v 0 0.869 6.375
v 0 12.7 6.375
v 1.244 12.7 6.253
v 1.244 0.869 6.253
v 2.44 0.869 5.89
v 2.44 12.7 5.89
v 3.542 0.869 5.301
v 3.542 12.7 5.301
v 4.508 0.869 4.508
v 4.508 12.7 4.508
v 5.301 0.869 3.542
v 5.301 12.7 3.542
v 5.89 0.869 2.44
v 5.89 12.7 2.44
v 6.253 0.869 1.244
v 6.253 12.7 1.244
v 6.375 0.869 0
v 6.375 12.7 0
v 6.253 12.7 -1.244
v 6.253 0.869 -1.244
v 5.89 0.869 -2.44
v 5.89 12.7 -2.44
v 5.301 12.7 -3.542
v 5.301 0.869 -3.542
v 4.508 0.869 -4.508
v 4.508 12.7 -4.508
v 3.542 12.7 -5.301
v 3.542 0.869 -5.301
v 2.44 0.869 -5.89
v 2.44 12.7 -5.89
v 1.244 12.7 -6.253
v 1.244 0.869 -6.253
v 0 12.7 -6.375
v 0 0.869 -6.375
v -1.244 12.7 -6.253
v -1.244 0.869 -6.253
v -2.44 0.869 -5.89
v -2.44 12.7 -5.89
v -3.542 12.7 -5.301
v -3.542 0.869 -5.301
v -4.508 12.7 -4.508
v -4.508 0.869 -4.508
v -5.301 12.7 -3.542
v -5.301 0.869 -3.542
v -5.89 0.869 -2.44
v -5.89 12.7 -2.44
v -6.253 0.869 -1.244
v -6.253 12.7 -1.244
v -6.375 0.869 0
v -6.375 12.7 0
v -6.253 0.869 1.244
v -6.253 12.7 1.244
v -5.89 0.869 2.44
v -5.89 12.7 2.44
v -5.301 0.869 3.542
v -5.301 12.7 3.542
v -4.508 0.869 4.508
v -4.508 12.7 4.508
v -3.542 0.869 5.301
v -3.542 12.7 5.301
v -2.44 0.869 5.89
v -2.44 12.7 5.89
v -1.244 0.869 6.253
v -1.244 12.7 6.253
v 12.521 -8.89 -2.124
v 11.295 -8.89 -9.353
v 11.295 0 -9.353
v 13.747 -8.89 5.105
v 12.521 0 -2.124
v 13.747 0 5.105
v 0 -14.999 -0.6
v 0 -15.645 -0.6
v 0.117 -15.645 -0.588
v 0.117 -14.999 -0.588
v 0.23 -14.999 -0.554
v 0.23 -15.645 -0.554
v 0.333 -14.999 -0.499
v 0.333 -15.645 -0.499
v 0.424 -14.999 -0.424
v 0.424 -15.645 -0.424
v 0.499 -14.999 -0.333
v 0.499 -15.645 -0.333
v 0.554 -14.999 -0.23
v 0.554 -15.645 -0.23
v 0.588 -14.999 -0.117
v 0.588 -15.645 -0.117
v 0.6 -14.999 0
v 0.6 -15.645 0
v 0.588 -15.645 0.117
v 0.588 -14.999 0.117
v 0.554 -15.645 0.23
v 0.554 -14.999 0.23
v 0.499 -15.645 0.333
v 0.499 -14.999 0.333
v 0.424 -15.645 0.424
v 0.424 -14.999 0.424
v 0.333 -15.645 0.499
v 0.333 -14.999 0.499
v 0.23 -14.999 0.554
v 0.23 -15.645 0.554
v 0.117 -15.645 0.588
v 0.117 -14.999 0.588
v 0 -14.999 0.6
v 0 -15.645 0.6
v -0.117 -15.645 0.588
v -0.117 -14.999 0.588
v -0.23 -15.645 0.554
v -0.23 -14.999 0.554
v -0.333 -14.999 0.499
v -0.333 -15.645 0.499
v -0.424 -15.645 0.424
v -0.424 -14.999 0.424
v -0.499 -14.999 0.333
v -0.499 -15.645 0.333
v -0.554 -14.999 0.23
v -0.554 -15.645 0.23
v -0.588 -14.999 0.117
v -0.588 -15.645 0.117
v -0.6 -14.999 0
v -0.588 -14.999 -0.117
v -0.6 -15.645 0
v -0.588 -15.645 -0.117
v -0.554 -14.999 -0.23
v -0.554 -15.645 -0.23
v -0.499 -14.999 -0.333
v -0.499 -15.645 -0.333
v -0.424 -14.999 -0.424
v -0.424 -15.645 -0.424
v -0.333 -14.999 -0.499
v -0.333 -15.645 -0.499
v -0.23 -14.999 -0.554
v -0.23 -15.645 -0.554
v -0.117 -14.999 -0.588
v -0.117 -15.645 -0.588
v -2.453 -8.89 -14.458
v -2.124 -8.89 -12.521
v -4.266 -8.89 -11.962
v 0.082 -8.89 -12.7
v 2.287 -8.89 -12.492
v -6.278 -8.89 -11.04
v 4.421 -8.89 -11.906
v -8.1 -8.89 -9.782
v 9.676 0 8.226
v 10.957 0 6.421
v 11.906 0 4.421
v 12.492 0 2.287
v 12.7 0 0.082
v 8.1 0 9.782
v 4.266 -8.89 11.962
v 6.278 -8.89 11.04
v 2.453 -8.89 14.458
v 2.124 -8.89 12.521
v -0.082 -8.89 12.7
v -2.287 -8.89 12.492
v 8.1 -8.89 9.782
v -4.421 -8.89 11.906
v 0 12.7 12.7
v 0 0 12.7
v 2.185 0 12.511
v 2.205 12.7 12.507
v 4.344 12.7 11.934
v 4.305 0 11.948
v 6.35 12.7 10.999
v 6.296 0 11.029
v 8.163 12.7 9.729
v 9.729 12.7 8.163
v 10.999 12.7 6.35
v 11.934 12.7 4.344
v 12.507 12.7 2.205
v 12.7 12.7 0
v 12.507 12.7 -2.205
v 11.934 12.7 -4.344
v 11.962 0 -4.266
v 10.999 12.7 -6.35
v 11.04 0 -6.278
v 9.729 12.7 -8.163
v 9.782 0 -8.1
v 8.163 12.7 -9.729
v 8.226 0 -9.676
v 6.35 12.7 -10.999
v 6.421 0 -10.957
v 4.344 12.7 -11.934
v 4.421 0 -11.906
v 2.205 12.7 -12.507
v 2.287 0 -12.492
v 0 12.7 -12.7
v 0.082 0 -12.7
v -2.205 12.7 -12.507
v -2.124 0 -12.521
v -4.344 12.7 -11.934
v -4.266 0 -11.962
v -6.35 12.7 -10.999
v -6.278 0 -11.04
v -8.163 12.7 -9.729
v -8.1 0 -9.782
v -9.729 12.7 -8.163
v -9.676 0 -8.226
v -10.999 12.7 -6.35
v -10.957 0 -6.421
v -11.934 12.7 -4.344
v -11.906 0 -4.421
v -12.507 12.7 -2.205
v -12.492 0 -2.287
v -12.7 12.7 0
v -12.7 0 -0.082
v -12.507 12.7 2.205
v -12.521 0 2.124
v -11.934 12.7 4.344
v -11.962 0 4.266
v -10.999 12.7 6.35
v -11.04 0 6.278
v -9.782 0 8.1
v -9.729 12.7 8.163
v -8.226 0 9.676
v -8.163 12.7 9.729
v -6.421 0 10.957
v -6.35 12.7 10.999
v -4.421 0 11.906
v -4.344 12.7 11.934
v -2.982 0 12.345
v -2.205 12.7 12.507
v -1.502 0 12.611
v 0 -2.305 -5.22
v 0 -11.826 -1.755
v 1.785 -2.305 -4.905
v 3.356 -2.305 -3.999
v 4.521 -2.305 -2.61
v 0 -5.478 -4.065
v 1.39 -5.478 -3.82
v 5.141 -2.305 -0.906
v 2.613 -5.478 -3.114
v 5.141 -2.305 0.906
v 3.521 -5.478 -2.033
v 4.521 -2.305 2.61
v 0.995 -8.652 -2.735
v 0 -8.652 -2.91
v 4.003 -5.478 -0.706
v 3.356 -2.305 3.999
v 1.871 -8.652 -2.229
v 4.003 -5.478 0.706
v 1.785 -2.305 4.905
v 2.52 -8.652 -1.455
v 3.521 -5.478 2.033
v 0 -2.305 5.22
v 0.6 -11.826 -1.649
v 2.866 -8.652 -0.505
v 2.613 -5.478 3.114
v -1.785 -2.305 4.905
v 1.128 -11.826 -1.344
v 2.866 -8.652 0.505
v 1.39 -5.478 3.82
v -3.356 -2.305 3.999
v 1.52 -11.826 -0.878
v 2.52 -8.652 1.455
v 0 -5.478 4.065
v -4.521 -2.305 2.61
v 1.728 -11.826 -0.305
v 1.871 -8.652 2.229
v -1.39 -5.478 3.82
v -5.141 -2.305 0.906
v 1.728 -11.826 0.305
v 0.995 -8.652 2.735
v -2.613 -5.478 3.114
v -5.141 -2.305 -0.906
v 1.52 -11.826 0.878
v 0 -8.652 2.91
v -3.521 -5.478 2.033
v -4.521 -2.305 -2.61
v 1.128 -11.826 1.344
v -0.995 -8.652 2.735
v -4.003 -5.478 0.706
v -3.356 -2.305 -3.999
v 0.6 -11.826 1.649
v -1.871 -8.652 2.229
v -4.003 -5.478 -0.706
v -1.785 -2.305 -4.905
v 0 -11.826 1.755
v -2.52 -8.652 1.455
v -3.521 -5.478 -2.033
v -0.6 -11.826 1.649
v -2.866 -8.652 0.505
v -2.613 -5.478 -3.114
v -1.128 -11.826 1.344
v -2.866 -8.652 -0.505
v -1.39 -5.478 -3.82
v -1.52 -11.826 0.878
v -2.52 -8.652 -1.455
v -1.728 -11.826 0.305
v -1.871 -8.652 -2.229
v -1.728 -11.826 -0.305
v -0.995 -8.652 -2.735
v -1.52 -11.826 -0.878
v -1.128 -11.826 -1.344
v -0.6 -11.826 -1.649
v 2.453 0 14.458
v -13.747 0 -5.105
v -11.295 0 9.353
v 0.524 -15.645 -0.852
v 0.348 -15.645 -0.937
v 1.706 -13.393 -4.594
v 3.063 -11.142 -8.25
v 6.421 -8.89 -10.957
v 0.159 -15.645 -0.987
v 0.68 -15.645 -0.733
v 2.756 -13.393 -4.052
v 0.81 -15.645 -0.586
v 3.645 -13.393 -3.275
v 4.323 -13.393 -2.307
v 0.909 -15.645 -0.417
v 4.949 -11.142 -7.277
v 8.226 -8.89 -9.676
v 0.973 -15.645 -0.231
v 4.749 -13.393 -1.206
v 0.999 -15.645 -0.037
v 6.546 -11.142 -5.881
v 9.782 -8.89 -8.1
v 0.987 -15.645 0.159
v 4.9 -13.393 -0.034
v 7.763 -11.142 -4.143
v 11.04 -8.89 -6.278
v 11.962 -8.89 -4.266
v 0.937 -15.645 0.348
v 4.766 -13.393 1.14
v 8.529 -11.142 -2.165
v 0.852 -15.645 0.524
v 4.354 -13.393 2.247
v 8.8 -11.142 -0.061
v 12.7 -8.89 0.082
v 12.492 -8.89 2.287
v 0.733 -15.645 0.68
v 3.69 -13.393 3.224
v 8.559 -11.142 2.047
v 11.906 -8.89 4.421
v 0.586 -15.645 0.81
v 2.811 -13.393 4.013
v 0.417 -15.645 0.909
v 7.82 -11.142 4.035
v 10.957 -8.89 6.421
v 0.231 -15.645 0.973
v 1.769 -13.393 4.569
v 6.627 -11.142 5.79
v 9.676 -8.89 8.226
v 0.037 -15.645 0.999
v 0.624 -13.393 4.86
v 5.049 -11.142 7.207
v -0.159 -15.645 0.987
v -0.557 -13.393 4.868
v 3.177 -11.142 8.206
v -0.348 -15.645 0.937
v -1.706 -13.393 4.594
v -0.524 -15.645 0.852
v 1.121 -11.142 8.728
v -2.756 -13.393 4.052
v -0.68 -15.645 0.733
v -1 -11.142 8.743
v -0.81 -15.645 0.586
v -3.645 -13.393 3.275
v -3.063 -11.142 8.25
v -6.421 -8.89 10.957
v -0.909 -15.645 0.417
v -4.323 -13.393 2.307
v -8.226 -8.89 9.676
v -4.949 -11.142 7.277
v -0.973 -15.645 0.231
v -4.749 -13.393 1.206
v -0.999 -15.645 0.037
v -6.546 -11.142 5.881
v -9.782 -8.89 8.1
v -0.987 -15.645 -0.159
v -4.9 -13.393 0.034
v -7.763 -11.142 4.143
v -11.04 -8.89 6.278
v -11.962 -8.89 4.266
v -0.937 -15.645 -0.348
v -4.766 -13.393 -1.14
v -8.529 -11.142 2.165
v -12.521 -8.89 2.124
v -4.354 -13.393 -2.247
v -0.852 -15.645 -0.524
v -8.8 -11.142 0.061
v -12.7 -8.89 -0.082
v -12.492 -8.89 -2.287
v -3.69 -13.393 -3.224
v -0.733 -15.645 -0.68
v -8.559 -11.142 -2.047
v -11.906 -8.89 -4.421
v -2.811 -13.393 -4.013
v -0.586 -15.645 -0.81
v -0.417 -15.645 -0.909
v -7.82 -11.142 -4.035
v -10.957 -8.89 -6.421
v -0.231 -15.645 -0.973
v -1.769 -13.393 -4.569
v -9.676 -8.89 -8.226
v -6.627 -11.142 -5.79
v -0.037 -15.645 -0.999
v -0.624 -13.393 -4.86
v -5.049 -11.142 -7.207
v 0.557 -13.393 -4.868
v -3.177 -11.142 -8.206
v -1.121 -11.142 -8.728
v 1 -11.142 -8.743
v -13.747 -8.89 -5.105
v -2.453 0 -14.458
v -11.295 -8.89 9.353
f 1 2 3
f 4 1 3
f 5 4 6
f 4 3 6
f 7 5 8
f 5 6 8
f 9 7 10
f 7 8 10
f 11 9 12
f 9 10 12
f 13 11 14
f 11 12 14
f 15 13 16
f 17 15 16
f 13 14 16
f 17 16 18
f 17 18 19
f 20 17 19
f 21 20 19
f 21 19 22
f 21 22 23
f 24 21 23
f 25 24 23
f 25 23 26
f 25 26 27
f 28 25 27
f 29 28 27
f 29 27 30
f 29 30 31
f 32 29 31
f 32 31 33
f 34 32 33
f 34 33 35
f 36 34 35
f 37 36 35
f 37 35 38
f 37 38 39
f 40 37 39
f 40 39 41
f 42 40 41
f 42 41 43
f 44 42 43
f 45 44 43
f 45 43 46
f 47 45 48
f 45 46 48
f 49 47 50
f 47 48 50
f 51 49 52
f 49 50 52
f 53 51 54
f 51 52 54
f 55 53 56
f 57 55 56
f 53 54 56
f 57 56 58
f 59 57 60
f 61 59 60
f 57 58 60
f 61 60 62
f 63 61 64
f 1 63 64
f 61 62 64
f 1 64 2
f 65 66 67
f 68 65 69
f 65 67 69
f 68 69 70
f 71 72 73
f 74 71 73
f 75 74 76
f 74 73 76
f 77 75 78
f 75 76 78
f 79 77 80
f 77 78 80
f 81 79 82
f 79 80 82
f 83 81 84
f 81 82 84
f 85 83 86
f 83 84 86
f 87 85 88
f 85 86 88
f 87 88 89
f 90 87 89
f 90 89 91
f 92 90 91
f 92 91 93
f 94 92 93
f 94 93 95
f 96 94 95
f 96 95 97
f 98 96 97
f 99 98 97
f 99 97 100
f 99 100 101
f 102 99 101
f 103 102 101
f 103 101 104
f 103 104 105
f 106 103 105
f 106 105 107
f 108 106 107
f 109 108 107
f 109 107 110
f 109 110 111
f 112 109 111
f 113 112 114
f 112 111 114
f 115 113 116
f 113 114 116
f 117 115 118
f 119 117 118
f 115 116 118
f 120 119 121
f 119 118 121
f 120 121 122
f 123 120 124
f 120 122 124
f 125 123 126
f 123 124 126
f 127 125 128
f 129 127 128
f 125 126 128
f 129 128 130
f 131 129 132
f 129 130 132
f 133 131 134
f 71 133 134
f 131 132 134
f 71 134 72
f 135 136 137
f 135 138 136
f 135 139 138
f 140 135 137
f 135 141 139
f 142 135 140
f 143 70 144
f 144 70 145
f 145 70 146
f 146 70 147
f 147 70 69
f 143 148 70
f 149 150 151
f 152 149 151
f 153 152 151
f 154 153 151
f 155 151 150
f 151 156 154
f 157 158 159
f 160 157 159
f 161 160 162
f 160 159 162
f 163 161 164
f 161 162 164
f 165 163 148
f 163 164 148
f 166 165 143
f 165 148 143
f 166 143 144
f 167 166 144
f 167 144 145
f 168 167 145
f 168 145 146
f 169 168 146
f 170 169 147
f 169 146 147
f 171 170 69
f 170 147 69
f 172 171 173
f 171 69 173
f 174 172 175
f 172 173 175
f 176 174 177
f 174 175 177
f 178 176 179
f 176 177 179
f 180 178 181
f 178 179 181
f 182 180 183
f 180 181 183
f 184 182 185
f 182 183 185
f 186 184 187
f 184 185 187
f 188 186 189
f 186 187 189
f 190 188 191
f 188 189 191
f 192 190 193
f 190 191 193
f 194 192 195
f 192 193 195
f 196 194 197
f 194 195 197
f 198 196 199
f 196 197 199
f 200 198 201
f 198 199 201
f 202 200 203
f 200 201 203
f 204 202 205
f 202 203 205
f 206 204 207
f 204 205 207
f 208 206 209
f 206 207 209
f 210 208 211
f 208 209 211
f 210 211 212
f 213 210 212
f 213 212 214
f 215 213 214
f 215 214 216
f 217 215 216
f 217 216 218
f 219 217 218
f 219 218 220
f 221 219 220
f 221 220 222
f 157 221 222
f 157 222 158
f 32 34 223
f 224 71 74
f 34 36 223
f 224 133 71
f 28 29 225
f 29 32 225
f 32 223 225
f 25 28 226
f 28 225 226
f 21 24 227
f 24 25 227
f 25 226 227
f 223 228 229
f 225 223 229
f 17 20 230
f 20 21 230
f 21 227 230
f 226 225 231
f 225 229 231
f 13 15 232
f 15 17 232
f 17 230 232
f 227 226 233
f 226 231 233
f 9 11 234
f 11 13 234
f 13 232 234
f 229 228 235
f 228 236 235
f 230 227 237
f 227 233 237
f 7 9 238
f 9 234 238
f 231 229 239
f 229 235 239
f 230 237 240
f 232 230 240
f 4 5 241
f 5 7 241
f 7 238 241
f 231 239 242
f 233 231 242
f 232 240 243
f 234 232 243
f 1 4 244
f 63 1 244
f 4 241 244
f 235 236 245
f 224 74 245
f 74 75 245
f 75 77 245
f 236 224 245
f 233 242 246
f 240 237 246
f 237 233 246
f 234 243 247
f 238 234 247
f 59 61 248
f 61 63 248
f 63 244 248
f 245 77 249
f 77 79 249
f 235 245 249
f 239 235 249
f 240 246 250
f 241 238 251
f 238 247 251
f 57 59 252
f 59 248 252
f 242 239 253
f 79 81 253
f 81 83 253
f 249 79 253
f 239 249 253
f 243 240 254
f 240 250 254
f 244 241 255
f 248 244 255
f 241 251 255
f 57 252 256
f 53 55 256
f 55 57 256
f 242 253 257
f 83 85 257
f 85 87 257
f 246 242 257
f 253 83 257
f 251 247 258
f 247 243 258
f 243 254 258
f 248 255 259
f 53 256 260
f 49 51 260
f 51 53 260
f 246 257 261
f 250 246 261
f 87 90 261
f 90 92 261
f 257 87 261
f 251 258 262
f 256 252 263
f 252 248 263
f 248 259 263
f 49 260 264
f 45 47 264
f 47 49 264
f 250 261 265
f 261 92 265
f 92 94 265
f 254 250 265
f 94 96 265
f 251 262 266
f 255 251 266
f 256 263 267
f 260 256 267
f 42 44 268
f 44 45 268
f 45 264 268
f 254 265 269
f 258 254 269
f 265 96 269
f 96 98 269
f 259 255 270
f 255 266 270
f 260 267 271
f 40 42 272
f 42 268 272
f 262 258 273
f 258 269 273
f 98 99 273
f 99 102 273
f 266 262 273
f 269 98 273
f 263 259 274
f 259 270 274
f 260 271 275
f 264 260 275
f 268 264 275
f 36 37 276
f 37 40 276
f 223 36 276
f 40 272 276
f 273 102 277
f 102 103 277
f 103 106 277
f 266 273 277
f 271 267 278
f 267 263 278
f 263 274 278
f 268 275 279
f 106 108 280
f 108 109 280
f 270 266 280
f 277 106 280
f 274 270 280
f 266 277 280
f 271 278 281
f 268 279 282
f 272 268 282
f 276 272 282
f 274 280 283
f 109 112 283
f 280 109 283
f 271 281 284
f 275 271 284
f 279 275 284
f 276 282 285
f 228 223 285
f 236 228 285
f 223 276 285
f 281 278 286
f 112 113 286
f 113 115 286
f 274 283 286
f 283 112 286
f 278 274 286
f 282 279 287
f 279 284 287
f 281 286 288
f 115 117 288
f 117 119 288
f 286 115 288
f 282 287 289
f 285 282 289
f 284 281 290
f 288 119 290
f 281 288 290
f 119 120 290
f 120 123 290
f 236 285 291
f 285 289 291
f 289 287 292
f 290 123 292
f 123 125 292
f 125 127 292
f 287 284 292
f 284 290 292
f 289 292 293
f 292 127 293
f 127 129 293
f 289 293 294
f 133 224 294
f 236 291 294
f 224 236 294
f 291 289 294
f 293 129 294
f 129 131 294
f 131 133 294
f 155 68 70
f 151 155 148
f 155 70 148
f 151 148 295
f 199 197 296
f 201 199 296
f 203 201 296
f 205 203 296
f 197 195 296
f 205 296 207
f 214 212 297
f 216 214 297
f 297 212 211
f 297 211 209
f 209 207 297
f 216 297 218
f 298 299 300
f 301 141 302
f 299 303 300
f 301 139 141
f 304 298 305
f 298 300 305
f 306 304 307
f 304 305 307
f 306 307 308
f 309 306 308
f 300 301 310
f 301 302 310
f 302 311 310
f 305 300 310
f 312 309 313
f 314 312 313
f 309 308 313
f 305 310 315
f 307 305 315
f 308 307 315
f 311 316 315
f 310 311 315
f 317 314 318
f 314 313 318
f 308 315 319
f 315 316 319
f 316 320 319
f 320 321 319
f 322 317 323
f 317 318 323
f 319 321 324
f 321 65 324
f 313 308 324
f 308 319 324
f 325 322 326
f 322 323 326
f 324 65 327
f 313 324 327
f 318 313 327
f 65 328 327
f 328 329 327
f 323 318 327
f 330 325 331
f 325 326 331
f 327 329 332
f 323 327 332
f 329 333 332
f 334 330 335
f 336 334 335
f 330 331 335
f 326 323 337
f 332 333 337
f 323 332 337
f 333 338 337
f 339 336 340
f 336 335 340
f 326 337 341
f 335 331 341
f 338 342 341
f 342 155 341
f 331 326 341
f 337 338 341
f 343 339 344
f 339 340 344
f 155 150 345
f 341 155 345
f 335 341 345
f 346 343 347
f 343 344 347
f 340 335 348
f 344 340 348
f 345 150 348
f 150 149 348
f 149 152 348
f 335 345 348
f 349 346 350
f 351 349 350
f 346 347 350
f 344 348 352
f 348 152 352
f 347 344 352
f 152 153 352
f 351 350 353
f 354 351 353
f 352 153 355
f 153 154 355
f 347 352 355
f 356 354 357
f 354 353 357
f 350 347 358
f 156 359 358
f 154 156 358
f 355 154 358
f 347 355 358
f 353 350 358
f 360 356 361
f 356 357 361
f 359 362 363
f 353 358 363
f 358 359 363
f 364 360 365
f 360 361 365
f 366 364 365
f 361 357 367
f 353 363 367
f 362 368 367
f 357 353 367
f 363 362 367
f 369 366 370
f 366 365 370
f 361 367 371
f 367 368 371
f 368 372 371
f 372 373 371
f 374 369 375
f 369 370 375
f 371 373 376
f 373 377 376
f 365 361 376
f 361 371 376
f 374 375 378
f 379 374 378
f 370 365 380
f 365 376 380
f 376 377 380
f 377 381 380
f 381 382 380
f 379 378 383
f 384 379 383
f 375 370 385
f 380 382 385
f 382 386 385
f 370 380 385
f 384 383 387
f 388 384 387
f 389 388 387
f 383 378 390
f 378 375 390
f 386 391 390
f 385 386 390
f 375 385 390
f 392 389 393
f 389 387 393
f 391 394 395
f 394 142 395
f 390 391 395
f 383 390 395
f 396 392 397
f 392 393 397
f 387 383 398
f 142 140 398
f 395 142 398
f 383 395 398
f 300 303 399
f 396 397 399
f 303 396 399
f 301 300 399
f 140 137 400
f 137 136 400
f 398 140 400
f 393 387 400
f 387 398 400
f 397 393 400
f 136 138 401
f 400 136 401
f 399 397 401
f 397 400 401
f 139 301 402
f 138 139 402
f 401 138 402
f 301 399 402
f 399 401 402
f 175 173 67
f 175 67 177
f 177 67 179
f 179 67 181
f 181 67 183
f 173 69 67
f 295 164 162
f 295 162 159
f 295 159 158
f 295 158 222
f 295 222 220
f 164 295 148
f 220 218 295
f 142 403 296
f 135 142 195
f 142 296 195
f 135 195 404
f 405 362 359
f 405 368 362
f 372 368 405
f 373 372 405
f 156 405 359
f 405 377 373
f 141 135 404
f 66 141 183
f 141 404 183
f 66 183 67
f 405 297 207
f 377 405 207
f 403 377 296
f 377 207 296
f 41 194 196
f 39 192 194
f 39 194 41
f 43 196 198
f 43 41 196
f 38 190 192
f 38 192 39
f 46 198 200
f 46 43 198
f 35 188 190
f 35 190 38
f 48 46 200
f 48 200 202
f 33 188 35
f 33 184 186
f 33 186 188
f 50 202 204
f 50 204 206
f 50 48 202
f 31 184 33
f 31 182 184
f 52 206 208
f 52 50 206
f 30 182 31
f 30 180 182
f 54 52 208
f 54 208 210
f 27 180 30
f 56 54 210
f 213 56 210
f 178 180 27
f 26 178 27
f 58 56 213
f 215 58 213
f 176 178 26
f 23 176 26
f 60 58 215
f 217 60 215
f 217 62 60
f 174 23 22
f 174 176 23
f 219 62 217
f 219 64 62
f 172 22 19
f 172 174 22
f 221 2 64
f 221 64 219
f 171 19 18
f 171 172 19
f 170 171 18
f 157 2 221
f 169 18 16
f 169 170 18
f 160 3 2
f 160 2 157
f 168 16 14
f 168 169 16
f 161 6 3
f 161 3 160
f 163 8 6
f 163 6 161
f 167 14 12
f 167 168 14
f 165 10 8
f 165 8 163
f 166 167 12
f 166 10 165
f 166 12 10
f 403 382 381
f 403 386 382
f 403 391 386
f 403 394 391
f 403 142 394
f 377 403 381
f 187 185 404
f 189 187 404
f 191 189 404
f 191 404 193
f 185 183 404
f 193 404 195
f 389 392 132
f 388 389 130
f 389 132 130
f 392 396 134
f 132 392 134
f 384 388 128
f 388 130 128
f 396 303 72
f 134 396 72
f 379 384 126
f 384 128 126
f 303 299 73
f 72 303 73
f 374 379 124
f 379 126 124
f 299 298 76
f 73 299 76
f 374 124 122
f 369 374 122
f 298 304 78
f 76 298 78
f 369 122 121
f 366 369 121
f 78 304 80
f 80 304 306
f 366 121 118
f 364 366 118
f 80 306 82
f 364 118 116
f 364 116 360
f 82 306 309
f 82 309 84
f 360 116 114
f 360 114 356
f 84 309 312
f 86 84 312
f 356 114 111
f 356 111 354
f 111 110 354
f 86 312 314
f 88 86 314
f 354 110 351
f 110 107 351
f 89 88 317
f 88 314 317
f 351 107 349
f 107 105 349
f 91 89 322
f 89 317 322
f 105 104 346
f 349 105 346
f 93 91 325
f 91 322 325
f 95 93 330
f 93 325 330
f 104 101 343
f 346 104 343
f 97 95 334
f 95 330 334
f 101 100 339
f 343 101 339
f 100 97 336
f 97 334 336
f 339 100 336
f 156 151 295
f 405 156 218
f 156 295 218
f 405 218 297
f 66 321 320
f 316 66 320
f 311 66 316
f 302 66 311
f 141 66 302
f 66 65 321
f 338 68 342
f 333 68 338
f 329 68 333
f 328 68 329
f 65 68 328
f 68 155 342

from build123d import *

# Parameters (mm, degrees)
SKETCH1_R           = 12.7
BOSS_EXTRUDE1_DEPTH = 12.7
BOSS_EXTRUDE2_DEPTH = 8.89
CUT_EXTRUDE1_REACH  = 36.662
SKETCH4_R           = 0.6
SKETCH5_R           = 6.3754
CUT_EXTRUDE2_DEPTH  = 11.83132


with BuildPart() as part:
    # Sketch1 → Boss-Extrude1 (new body)
    with BuildSketch(Plane(origin=(0, 0, 0), x_dir=(1, 0, 0), z_dir=(0, 1, 0))):
        with Locations(Location((0, 0, 0), (0, 0, 270))):
            Circle(SKETCH1_R)
    extrude(amount=BOSS_EXTRUDE1_DEPTH)

    # Sketch2 → Boss-Extrude2 (add)
    with BuildSketch(Plane(origin=(0, 0, 0), x_dir=(-1, 0, 0), z_dir=(0, -1, 0))):
        Polygon((-11.29479914, 9.353119572), (-13.747438724, -5.105023199), (-2.452639584, -14.458142772), (11.29479914, -9.353119572), (13.747438724, 5.105023199), (2.452639584, 14.458142772), align=None)
    extrude(amount=BOSS_EXTRUDE2_DEPTH)

    # Sketch3 → Revolve1 (revolve)
    with BuildSketch(Plane.XY, mode=Mode.PRIVATE) as revolve1_sk:
        Polygon((-1, -15.64499815), (-12.7, -8.89), (0, -8.89), (0, -15.64499815), align=None)
    revolve(revolve1_sk.sketch.rotate(Axis((0, -8.89, 0), (0, -1, 0)), 110.372156134), axis=Axis((0, -8.89, 0), (0, -1, 0)))

    # Sketch4 → Cut-Extrude1 (cut, up to next)
    with BuildSketch(Plane.XZ.offset(15.64499815), mode=Mode.PRIVATE) as cut_extrude1_sk1:
        with Locations(Location((0, 0, 0), (0, 0, 270))):
            Circle(SKETCH4_R)
    cut_extrude1_tool1 = extrude(cut_extrude1_sk1.sketch, amount=-CUT_EXTRUDE1_REACH, mode=Mode.PRIVATE) & part.part
    add(cut_extrude1_tool1.solids().sort_by_distance((0, -15.644998, 0))[0], mode=Mode.SUBTRACT)

    # Sketch5 → Cut-Extrude2 (cut)
    with BuildSketch(Plane(origin=(0, 12.7, 0), x_dir=(1, 0, 0), z_dir=(0, 1, 0))):
        with Locations(Location((0, 0, 0), (0, 0, 270))):
            Circle(SKETCH5_R)
    extrude(amount=-CUT_EXTRUDE2_DEPTH, mode=Mode.SUBTRACT)

    # Sketch6 → Cut-Revolve1 (revolve, cut)
    with BuildSketch(Plane.XY, mode=Mode.PRIVATE) as cut_revolve1_sk:
        Polygon((0, 0.86868), (6.3754, 0.86868), (0, -16.64758754), align=None)
    revolve(cut_revolve1_sk.sketch.rotate(Axis((0, 0.86868, 0), (0, -1, 0)), 270), axis=Axis((0, 0.86868, 0), (0, -1, 0)), mode=Mode.SUBTRACT)


solid = part.part
